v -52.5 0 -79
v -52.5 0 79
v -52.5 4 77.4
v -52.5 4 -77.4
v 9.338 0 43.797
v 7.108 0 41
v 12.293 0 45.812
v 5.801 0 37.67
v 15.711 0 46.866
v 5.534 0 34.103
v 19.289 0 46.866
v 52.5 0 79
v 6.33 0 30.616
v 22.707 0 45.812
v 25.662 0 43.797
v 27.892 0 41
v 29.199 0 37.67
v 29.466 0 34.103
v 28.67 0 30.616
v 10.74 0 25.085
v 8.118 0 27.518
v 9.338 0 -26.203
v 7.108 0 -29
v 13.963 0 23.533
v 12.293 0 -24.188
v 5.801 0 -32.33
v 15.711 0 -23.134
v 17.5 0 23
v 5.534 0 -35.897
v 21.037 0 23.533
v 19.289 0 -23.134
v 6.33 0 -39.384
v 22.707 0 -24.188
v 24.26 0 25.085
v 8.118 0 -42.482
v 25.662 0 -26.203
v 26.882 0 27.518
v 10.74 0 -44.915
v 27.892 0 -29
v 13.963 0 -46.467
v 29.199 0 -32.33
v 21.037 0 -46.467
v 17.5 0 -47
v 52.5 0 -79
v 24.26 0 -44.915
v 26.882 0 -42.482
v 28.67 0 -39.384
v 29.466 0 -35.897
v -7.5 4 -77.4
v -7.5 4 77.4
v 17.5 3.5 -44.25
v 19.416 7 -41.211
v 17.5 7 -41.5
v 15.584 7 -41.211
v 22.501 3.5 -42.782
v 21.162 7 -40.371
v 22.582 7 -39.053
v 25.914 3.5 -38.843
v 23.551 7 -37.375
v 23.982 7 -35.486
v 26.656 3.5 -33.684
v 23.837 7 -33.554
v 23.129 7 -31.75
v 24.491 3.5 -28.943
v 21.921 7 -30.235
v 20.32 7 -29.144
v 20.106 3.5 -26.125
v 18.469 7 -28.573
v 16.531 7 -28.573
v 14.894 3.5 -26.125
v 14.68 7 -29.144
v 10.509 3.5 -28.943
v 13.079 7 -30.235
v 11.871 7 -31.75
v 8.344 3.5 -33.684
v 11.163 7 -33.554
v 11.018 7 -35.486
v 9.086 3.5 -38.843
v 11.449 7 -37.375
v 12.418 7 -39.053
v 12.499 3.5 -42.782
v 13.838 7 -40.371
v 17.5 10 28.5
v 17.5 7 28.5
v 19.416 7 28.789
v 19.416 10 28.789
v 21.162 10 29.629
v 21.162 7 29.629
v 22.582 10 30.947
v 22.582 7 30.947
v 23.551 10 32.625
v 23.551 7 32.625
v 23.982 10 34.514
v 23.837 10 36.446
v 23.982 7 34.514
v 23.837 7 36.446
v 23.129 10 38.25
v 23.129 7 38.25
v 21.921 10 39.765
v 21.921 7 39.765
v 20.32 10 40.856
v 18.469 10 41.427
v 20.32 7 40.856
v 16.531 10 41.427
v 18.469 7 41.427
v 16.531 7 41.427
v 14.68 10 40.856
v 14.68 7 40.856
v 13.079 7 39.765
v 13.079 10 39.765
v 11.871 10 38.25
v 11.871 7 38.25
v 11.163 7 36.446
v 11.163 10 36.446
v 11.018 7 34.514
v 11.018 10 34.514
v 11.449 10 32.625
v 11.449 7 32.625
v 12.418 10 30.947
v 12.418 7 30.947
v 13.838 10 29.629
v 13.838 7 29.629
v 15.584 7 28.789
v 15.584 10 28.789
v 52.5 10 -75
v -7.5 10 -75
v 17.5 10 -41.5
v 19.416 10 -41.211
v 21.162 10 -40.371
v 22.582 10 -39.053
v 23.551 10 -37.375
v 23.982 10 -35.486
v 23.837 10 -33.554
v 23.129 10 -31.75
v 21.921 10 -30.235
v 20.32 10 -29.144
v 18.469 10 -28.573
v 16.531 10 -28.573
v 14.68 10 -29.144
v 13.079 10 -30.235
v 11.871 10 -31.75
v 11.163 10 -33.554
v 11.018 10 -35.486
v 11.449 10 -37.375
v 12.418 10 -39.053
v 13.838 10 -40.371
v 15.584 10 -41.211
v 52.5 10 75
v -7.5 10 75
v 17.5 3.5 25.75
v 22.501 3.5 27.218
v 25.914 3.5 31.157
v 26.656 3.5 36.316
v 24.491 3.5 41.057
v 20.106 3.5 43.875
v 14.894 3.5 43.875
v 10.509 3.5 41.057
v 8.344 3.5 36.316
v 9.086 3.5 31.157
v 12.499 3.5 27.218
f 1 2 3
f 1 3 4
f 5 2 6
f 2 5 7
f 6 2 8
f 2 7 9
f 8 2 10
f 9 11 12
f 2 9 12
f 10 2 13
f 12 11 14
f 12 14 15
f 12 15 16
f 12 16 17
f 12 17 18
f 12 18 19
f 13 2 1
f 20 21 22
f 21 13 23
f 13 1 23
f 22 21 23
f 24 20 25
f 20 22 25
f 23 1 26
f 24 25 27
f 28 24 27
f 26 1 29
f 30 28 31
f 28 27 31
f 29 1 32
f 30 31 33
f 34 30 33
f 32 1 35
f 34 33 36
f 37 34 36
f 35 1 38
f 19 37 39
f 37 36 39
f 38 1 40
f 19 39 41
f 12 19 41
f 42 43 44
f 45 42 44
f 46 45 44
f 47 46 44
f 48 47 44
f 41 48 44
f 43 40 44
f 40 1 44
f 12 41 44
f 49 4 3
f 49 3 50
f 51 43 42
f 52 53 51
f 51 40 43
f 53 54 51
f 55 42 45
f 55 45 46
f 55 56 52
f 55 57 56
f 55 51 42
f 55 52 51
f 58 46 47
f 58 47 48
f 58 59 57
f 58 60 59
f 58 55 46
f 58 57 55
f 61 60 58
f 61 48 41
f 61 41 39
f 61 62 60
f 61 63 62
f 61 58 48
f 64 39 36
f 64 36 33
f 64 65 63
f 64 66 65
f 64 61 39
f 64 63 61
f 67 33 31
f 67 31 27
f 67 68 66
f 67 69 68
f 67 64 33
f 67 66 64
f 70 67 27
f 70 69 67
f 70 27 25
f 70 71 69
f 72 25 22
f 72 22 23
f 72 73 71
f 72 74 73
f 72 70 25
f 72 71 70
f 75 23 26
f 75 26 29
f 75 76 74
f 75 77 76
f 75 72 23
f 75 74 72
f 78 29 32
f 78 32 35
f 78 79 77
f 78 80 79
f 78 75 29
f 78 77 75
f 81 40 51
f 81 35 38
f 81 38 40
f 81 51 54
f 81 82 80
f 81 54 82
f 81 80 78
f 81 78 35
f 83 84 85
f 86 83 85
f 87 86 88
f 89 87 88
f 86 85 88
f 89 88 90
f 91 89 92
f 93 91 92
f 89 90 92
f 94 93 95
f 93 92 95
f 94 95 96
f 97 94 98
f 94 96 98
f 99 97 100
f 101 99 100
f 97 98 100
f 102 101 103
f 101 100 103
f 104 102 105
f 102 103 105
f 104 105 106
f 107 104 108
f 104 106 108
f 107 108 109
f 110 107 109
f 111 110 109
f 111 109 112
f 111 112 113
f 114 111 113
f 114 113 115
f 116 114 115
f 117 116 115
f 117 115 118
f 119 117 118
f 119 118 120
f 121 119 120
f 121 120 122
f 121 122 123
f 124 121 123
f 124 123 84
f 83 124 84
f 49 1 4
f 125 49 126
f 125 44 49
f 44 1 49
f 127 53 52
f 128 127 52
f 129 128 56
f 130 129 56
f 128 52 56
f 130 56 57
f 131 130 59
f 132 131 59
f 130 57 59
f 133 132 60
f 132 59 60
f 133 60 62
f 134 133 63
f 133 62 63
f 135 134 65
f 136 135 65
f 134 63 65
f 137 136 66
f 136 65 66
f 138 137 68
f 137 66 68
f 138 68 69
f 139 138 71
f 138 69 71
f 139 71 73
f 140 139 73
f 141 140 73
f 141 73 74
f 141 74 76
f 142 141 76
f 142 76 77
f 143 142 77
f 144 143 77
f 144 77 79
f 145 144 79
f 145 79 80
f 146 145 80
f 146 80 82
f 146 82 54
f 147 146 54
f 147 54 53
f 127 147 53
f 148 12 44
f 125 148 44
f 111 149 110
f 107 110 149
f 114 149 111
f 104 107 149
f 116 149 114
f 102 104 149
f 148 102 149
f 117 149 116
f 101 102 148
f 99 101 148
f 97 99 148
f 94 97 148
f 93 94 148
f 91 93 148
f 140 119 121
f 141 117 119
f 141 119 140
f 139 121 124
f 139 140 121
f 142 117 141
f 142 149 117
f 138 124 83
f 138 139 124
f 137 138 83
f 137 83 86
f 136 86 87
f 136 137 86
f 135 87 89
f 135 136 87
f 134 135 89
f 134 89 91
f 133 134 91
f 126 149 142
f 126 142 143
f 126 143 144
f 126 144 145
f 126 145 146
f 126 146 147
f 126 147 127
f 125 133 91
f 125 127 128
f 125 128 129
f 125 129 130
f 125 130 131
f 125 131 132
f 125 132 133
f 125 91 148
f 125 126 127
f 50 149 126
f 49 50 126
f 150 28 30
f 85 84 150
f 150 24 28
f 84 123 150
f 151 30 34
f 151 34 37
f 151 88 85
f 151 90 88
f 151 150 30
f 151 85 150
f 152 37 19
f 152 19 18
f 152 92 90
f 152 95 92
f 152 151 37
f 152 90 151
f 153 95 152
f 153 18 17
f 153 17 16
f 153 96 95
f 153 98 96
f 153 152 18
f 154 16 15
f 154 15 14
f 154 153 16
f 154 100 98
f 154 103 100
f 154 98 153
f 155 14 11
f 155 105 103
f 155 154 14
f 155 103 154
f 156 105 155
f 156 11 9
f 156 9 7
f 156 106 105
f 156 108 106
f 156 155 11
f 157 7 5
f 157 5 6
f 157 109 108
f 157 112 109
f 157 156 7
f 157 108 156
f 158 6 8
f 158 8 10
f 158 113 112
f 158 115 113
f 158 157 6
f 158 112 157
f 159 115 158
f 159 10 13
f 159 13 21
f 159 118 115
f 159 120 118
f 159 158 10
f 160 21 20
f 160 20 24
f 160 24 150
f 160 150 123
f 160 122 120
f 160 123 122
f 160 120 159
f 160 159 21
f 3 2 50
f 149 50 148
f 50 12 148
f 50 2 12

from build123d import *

# Parameters (mm, degrees)
SKETCH_1_W                          = 105
SKETCH_1_H                          = 158
EXTRUDE_1_DEPTH                     = 10
CUT_EXTRUDE_1_REACH                 = 97.38
SKETCH_2_R                          = 6.5
CHAMFER_1_SIZE                      = 5.5
CHAMFER_1_SIZE2                     = 7
PATTERN_LINEAR_1_COUNT              = 2
PATTERN_LINEAR_1_PITCH              = 70
CHAMFER_1_OF_PATTERN_LINEAR_1_SIZE2 = 7
CHAMFER_1_OF_PATTERN_LINEAR_1_SIZE  = 5.5
CUT_EXTRUDE_2_REACH                 = 133.78
SKETCH_4_W                          = 45
SKETCH_4_H                          = 158
CUT_EXTRUDE_3_DEPTH                 = 6


with BuildPart() as part:
    # 草图1 → 凸台-拉伸1 (new body)
    with BuildSketch(Plane(origin=(0, 0, 0), x_dir=(1, 0, 0), z_dir=(0, 1, 0))):
        Rectangle(SKETCH_1_W, SKETCH_1_H)
    extrude(amount=EXTRUDE_1_DEPTH)

    # 草图2 → 切除-拉伸1 (cut, up to next)
    with BuildSketch(Plane.XZ, mode=Mode.PRIVATE) as cut_extrude_1_sk1:
        with Locations(Location((17.5, 35, 0), (0, 0, 270))):
            Circle(SKETCH_2_R)
    cut_extrude_1_tool1 = extrude(cut_extrude_1_sk1.sketch, amount=-CUT_EXTRUDE_1_REACH, mode=Mode.PRIVATE) & part.part
    cut_extrude_1 = cut_extrude_1_tool1.solids().sort_by_distance((17.5, 0, 35))[0]
    add(cut_extrude_1, mode=Mode.SUBTRACT)

    # 倒角1
    chamfer_1_edges = [part.edges().sort_by_distance(p)[0] for p in [
        (17.5, 0, 41.5),
    ]]
    chamfer_1_side = [part.faces().sort_by_distance(p)[0] for p in [
        (-0.141142206, 0, -0.282284412),
    ]]
    chamfer(chamfer_1_edges, length=CHAMFER_1_SIZE, length2=CHAMFER_1_SIZE2, reference=chamfer_1_side[0])

    # 阵列(线性)1: 切除-拉伸1 ×2
    with Locations(*[(0, 0, -i * PATTERN_LINEAR_1_PITCH) for i in range(1, PATTERN_LINEAR_1_COUNT)]):
        add(cut_extrude_1, mode=Mode.SUBTRACT)

    # 倒角1 of 阵列(线性)1
    chamfer_1_of_pattern_linear_1_edges = [part.edges().sort_by_distance(p)[0] for p in [
        (17.5, 0, -28.5),
    ]]
    chamfer(chamfer_1_of_pattern_linear_1_edges, length=CHAMFER_1_OF_PATTERN_LINEAR_1_SIZE, length2=CHAMFER_1_OF_PATTERN_LINEAR_1_SIZE2)

    # 草图3 → 切除-拉伸2 (cut, up to next)
    with BuildSketch(Plane(origin=(52.5, 0, 0), x_dir=(0, 0, -1), z_dir=(1, 0, 0)), mode=Mode.PRIVATE) as cut_extrude_2_sk1:
        Polygon((-79, 10), (-79, 0), (-75.000285359, 10), align=None)
    cut_extrude_2_tool1 = extrude(cut_extrude_2_sk1.sketch, amount=-CUT_EXTRUDE_2_REACH, mode=Mode.PRIVATE) & part.part
    # 草图3 → 切除-拉伸2 (cut, up to next)
    with BuildSketch(Plane(origin=(52.5, 0, 0), x_dir=(0, 0, -1), z_dir=(1, 0, 0)), mode=Mode.PRIVATE) as cut_extrude_2_sk2:
        Polygon((79, 10), (79, 0), (75.000285359, 10), align=None)
    cut_extrude_2_tool2 = extrude(cut_extrude_2_sk2.sketch, amount=-CUT_EXTRUDE_2_REACH, mode=Mode.PRIVATE) & part.part
    add(cut_extrude_2_tool1.solids().sort_by_distance((52.5, 6.666667, 77.666762))[0], mode=Mode.SUBTRACT)
    add(cut_extrude_2_tool2.solids().sort_by_distance((52.5, 6.666667, -77.666762))[0], mode=Mode.SUBTRACT)

    # 草图4 → 切除-拉伸3 (cut)
    with BuildSketch(Plane(origin=(0, 10, 0), x_dir=(1, 0, 0), z_dir=(0, 1, 0))):
        with Locations((-30, 0)):
            Rectangle(SKETCH_4_W, SKETCH_4_H)
    extrude(amount=-CUT_EXTRUDE_3_DEPTH, mode=Mode.SUBTRACT)


solid = part.part
